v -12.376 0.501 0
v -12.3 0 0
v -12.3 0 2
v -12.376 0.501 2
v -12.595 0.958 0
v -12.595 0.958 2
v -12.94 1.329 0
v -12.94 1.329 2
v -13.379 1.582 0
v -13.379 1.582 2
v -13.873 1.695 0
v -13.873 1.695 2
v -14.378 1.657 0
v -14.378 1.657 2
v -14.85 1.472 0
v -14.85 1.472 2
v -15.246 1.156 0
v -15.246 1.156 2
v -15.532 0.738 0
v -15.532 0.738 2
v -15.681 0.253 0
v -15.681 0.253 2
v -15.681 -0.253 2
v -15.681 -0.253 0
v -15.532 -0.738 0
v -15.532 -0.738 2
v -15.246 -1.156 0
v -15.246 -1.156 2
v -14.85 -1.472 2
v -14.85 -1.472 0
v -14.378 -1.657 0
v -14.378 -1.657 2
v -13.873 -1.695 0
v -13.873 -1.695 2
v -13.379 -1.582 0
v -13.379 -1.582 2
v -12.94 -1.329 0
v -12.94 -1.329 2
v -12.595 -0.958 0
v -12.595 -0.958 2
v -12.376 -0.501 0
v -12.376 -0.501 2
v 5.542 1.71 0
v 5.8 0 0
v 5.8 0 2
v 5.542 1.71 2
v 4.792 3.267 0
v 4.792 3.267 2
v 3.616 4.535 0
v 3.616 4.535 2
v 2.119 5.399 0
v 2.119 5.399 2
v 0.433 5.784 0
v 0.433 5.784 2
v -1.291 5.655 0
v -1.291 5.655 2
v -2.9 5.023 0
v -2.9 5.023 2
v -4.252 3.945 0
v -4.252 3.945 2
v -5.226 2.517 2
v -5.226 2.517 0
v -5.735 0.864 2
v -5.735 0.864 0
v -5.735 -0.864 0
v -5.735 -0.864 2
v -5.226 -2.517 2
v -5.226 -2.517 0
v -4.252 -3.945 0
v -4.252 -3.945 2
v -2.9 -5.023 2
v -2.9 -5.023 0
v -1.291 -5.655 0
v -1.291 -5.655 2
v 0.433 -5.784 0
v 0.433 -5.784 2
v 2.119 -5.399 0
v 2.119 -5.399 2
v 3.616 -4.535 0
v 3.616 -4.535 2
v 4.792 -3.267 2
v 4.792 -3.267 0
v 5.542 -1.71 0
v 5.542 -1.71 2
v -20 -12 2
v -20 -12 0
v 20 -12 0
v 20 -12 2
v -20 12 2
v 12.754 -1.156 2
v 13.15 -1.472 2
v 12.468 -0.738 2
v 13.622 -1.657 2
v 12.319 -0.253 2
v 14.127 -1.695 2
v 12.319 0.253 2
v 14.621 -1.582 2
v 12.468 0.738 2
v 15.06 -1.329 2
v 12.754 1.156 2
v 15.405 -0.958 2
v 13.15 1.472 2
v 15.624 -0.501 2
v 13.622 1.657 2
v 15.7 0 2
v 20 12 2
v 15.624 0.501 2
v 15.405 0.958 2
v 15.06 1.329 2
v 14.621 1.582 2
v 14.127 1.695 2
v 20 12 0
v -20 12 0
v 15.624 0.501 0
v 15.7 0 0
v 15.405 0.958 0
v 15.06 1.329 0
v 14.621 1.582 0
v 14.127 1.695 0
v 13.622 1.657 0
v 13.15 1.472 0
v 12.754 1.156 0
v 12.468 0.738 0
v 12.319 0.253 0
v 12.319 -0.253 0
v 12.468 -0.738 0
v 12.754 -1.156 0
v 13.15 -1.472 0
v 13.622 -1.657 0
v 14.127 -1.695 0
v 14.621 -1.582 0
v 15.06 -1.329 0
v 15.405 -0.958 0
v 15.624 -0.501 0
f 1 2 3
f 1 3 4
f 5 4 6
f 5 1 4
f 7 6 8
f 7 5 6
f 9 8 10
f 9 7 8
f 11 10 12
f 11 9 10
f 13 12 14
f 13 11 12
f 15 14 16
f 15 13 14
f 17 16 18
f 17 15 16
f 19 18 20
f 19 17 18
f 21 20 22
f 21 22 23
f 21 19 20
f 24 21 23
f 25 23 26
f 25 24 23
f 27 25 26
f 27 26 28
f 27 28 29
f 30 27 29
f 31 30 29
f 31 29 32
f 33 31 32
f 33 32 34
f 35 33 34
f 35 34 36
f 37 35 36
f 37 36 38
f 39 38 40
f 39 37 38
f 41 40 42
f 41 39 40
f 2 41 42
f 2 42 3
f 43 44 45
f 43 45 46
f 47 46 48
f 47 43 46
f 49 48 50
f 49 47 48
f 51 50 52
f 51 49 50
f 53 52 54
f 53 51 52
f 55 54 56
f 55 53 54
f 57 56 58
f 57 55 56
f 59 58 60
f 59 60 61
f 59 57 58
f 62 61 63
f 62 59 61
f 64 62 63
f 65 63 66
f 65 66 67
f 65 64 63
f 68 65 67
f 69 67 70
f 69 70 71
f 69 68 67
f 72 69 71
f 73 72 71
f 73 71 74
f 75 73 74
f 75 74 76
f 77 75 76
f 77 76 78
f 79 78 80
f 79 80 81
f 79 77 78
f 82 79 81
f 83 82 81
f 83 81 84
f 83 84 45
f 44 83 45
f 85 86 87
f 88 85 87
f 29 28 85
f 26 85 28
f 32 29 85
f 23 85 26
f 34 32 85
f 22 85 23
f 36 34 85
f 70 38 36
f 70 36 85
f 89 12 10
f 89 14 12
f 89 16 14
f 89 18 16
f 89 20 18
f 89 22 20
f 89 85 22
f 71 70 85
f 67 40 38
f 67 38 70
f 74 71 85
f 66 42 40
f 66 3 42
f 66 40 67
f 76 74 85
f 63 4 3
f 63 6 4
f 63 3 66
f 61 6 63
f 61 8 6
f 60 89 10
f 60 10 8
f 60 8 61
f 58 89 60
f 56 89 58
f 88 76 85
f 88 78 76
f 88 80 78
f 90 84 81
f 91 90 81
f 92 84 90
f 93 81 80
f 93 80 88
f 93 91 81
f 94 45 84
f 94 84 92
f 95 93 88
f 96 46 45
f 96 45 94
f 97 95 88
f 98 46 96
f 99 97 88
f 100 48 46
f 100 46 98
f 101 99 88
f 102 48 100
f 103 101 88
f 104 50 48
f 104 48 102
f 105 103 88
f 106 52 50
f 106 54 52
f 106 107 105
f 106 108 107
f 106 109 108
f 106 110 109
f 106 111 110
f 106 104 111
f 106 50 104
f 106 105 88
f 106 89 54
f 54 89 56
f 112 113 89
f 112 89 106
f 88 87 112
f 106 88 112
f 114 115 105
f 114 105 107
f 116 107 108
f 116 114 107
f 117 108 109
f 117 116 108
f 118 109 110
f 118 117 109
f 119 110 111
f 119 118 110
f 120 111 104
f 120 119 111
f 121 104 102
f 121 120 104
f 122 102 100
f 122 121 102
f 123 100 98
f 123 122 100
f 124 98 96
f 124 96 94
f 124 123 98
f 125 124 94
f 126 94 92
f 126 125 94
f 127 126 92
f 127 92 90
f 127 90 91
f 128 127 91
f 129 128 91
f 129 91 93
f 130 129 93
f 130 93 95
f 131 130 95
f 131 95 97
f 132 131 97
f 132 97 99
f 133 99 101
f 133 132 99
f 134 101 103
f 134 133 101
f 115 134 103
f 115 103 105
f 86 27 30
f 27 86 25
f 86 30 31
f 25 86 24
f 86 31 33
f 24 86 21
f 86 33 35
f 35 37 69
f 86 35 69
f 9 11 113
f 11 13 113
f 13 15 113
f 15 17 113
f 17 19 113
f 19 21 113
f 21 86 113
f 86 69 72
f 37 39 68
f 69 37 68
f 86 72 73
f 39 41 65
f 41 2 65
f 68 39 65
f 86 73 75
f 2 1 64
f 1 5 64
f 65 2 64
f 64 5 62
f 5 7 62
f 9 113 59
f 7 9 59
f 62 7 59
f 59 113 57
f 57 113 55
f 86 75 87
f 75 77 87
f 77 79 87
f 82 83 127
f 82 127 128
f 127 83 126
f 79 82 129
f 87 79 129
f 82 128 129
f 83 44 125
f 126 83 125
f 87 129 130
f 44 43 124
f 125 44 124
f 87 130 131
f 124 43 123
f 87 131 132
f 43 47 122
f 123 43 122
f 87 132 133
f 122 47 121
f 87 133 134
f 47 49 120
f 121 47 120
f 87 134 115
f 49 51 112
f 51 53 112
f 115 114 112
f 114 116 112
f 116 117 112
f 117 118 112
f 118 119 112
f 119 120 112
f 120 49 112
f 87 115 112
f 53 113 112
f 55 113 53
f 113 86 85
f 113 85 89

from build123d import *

# Parameters (mm, degrees)
SKETCH_1_W                     = 40
SKETCH_1_H                     = 24
SKETCH_1_R                     = 5.8
SKETCH_1_R_2                   = 1.7
BEARING_RETAINER_40X24X2_DEPTH = 2


with BuildPart() as part:
    # 草图1 → Bearing_retainer_40x24x2 (new body)
    with BuildSketch(Plane.XY):
        Rectangle(SKETCH_1_W, SKETCH_1_H)
        Circle(SKETCH_1_R, mode=Mode.SUBTRACT)
        with Locations((-14, 0)):
            Circle(SKETCH_1_R_2, mode=Mode.SUBTRACT)
        with Locations((14, 0)):
            Circle(SKETCH_1_R_2, mode=Mode.SUBTRACT)
    extrude(amount=BEARING_RETAINER_40X24X2_DEPTH)


solid = part.part
